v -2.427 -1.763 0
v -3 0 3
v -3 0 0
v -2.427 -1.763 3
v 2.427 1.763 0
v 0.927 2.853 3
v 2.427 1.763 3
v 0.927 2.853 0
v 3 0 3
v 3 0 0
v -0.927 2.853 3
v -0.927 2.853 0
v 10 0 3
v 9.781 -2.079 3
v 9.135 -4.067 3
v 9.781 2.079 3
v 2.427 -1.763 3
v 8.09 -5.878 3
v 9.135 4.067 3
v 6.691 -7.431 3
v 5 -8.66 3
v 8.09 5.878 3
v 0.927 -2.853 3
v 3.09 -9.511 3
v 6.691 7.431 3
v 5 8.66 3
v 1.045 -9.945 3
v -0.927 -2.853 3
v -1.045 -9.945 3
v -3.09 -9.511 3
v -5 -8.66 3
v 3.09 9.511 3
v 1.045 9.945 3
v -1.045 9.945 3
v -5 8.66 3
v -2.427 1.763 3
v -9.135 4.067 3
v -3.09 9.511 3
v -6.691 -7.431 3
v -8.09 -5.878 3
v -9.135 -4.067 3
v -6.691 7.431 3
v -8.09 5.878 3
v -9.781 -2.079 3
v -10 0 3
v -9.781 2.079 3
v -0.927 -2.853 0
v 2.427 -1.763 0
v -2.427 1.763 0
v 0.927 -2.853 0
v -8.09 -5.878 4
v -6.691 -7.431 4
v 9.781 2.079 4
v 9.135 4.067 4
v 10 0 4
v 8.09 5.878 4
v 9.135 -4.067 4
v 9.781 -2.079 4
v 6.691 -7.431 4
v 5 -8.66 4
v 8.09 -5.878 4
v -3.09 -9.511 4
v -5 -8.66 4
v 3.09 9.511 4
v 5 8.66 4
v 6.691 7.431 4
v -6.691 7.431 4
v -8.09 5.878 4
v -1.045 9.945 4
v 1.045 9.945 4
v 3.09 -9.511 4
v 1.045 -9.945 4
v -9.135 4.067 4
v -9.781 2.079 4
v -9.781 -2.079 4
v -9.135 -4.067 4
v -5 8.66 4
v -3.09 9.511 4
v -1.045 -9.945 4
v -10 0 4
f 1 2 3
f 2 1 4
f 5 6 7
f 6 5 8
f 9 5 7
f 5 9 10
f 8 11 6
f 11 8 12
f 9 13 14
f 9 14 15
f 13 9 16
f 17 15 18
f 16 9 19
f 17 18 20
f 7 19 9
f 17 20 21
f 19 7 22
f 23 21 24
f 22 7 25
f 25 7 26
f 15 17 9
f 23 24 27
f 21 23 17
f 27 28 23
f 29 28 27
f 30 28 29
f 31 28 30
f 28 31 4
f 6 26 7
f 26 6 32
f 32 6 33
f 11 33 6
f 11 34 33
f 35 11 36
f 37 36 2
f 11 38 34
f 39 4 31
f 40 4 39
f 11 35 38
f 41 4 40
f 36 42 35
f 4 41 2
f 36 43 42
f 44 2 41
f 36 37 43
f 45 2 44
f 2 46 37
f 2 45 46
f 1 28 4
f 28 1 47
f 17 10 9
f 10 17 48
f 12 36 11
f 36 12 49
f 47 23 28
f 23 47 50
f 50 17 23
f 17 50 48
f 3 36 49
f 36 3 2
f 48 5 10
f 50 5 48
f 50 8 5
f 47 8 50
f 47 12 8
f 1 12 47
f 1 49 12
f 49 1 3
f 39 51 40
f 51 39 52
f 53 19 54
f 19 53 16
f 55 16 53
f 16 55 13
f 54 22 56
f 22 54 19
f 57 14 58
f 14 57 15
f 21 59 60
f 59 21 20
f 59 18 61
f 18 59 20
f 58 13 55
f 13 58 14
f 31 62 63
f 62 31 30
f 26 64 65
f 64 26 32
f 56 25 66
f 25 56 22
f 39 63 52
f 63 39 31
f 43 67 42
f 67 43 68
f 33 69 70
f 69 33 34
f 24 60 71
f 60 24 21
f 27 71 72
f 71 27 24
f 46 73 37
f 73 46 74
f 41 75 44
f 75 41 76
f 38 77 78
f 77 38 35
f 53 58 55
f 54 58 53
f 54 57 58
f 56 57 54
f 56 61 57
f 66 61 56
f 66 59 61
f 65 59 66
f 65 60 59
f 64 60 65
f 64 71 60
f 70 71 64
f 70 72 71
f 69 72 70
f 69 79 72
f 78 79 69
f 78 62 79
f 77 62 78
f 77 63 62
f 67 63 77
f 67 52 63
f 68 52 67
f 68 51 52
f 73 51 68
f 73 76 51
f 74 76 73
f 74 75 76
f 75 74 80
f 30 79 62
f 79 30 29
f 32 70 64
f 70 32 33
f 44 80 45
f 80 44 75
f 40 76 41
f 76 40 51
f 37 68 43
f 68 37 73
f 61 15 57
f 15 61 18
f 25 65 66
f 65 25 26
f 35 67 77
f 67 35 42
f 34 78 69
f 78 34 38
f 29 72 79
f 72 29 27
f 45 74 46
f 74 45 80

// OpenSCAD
cylinder(r=3, h=3);
translate([0, 0, 3]) {
	cylinder(r=10, h=1);
}
